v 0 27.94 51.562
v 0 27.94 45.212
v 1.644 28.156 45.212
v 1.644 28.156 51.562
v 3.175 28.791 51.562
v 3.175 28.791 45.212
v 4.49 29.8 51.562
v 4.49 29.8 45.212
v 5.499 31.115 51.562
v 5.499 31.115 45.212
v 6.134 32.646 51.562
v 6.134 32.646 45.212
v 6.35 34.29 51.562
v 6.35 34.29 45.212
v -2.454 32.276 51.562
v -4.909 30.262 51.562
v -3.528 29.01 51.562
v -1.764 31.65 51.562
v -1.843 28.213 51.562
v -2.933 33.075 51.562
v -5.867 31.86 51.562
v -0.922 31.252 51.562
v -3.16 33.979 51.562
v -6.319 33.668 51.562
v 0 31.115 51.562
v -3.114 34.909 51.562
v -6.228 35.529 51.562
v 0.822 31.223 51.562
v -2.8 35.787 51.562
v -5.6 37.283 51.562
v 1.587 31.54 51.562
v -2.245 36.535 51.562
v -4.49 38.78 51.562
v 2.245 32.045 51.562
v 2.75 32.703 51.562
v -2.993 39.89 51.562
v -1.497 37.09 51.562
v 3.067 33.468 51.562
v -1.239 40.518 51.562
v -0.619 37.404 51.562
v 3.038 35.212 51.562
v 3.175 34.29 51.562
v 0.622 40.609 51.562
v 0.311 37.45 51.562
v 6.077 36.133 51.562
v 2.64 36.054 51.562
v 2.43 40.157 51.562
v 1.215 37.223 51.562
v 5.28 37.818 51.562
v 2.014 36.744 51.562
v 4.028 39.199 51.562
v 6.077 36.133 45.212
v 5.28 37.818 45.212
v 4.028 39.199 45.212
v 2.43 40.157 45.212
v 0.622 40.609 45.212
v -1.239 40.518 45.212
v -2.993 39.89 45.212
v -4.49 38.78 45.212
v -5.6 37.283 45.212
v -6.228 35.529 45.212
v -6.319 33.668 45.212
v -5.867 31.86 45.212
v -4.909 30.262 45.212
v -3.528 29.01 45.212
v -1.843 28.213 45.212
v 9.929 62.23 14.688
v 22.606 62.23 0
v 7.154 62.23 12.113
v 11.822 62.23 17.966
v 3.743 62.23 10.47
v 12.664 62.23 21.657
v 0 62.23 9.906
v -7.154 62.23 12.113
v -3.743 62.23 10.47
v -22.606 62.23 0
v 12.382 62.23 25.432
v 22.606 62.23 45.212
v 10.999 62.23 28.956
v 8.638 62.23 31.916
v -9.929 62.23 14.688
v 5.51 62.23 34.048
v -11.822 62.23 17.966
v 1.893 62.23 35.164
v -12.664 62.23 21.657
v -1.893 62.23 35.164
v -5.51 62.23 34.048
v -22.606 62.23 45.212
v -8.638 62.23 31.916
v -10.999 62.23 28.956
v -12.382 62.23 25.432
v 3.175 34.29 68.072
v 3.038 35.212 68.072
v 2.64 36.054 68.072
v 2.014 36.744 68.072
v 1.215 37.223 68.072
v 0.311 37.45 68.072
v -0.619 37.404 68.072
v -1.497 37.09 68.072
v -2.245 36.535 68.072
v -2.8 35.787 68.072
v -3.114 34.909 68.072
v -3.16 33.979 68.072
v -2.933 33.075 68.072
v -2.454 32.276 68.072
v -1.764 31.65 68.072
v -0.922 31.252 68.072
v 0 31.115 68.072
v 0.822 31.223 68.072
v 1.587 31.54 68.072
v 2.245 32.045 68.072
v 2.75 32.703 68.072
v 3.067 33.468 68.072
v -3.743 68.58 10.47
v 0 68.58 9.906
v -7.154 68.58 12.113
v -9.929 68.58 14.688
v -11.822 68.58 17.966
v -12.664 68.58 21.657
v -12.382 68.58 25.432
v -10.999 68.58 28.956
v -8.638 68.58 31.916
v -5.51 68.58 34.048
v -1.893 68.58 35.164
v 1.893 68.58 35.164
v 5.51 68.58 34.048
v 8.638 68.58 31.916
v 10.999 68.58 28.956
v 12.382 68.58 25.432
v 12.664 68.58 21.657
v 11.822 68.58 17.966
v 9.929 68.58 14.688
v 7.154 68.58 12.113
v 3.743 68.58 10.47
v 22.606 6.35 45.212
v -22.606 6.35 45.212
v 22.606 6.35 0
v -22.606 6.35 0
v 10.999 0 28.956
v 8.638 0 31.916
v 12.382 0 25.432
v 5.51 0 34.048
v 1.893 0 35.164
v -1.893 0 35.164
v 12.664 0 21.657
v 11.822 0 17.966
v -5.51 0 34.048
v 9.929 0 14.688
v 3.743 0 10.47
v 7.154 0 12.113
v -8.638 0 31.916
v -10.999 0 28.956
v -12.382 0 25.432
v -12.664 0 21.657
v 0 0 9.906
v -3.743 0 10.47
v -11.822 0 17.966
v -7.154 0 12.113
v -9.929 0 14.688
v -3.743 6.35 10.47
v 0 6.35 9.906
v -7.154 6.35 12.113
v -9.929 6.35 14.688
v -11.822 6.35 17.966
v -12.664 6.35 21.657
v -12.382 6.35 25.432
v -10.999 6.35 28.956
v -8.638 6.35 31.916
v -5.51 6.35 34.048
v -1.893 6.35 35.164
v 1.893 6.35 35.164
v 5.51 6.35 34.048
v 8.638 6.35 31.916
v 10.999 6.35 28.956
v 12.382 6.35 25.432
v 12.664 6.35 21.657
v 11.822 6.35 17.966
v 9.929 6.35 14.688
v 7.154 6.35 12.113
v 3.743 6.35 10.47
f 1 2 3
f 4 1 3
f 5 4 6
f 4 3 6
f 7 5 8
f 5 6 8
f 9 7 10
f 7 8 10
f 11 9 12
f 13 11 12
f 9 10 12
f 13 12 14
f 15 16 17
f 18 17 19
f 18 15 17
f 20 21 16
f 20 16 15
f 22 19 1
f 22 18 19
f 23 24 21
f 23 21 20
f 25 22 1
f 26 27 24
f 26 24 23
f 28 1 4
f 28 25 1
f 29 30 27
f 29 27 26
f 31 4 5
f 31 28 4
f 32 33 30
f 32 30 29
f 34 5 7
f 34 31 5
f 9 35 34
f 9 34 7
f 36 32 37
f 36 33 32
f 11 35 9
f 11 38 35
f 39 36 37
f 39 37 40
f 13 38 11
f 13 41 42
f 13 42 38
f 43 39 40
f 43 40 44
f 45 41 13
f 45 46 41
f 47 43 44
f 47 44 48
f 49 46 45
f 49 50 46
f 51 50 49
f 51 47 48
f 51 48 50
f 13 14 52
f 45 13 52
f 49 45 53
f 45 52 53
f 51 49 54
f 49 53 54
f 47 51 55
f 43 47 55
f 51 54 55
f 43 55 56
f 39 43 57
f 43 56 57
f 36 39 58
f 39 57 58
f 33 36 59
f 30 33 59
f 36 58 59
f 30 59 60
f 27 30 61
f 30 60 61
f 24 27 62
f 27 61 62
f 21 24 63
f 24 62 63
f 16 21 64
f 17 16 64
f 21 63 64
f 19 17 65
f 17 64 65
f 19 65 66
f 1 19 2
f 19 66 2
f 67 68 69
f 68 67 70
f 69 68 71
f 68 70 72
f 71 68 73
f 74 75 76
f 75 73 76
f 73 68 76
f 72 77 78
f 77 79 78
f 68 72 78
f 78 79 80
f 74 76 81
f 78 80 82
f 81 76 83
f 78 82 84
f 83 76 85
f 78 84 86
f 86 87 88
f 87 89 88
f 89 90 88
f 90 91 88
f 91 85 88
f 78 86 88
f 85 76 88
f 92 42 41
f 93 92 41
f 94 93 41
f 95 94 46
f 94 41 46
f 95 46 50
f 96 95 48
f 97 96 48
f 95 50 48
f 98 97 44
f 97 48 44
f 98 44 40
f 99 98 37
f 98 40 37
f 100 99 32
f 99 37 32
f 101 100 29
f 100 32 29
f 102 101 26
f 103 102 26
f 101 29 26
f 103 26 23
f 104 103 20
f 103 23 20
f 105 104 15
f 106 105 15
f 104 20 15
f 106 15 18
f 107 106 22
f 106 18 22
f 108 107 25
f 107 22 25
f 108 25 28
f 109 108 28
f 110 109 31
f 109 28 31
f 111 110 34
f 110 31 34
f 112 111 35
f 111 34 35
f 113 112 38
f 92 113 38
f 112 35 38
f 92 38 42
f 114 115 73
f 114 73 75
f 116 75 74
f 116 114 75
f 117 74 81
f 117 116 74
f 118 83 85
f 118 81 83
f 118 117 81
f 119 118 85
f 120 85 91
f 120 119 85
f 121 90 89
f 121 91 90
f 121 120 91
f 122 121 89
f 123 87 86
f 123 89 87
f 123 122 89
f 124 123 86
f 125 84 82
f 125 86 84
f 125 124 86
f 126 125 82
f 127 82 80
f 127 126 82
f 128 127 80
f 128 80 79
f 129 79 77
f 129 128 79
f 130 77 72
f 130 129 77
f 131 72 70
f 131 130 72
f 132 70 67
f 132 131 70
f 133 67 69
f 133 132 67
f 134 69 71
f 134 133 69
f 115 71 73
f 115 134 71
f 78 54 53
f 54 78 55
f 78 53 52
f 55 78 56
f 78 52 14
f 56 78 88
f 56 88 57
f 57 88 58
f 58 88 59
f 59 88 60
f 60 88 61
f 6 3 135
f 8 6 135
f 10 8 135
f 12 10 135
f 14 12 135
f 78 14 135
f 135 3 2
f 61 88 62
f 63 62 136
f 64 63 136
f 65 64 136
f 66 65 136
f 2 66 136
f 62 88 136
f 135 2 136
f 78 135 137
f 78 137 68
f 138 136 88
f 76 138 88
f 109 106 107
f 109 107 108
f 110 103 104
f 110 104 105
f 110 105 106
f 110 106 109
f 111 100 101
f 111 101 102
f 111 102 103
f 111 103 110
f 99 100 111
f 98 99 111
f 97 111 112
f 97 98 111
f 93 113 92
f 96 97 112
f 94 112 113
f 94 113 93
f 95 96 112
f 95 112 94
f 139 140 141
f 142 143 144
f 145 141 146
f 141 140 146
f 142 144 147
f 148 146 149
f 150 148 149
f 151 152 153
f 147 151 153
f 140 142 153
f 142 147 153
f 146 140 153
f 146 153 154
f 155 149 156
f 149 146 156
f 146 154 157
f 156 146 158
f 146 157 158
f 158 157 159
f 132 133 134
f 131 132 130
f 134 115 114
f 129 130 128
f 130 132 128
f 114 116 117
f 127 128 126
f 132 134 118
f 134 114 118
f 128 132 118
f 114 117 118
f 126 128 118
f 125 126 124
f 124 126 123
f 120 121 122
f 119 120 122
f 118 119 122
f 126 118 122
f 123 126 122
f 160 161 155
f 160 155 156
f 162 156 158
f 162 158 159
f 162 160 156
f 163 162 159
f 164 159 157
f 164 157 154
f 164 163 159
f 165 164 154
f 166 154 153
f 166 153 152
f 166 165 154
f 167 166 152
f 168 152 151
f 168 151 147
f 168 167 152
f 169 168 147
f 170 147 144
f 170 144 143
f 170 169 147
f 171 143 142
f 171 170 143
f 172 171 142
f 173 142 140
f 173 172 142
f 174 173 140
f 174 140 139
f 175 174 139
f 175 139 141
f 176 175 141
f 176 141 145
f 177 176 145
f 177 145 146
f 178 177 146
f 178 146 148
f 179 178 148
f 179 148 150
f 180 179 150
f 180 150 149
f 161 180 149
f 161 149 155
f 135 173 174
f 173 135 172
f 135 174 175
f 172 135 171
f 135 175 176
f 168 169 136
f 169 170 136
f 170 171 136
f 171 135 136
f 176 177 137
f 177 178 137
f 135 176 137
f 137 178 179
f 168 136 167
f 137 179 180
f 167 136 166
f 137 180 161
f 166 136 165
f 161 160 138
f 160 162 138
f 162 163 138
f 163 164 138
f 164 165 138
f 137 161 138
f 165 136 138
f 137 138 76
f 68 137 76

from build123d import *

# Parameters (mm, degrees)
BOSS_EXTRUDE1_DEPTH      = 22.606
BOSS_EXTRUDE1_DEPTH_BACK = 22.606
SKETCH1_5_W              = 6.35
SKETCH1_5_H              = 35.306
SKETCH2_R                = 3.175
BOSS_EXTRUDE2_DEPTH      = 22.86
SKETCH2_3_R              = 6.35
SKETCH2_3_R_2            = 3.175
BOSS_EXTRUDE3_DEPTH      = 6.35


with BuildPart() as part:
    # Sketch1 → Boss-Extrude1 (new, two sides: drawn at the far end of the back side and taken through both)
    with BuildSketch(Plane.YZ.offset(-BOSS_EXTRUDE1_DEPTH_BACK)):
        Polygon((6.35, 9.906), (6.35, 0), (62.23, 0), (62.23, 9.906), (68.58, 9.906), (68.58, 35.306), (62.23, 35.306), (62.23, 45.212), (6.35, 45.212), (6.35, 35.306), (0, 35.306), (0, 9.906), align=None)
    extrude(amount=BOSS_EXTRUDE1_DEPTH + BOSS_EXTRUDE1_DEPTH_BACK)

    # Sketch1<5> → Cut-Revolve3 (revolve, cut)
    with BuildSketch(Plane.YZ):
        with Locations((3.175, 52.959)):
            Rectangle(SKETCH1_5_W, SKETCH1_5_H)
        with Locations((65.405, 52.959)):
            Rectangle(SKETCH1_5_W, SKETCH1_5_H)
    revolve(axis=Axis((0, 6.35, 22.606), (0, 1, 0)), mode=Mode.SUBTRACT)

    # Sketch2 → Boss-Extrude2 (add)
    with BuildSketch(Plane.XY.offset(45.212)):
        with Locations((0, 34.29)):
            Circle(SKETCH2_R)
    extrude(amount=BOSS_EXTRUDE2_DEPTH)

    # Sketch2<3> → Boss-Extrude3 (add)
    with BuildSketch(Plane.XY.offset(45.212)):
        with Locations((0, 34.29)):
            Circle(SKETCH2_3_R)
        with Locations((0, 34.29)):
            Circle(SKETCH2_3_R_2, mode=Mode.SUBTRACT)
    extrude(amount=BOSS_EXTRUDE3_DEPTH)


solid = part.part
